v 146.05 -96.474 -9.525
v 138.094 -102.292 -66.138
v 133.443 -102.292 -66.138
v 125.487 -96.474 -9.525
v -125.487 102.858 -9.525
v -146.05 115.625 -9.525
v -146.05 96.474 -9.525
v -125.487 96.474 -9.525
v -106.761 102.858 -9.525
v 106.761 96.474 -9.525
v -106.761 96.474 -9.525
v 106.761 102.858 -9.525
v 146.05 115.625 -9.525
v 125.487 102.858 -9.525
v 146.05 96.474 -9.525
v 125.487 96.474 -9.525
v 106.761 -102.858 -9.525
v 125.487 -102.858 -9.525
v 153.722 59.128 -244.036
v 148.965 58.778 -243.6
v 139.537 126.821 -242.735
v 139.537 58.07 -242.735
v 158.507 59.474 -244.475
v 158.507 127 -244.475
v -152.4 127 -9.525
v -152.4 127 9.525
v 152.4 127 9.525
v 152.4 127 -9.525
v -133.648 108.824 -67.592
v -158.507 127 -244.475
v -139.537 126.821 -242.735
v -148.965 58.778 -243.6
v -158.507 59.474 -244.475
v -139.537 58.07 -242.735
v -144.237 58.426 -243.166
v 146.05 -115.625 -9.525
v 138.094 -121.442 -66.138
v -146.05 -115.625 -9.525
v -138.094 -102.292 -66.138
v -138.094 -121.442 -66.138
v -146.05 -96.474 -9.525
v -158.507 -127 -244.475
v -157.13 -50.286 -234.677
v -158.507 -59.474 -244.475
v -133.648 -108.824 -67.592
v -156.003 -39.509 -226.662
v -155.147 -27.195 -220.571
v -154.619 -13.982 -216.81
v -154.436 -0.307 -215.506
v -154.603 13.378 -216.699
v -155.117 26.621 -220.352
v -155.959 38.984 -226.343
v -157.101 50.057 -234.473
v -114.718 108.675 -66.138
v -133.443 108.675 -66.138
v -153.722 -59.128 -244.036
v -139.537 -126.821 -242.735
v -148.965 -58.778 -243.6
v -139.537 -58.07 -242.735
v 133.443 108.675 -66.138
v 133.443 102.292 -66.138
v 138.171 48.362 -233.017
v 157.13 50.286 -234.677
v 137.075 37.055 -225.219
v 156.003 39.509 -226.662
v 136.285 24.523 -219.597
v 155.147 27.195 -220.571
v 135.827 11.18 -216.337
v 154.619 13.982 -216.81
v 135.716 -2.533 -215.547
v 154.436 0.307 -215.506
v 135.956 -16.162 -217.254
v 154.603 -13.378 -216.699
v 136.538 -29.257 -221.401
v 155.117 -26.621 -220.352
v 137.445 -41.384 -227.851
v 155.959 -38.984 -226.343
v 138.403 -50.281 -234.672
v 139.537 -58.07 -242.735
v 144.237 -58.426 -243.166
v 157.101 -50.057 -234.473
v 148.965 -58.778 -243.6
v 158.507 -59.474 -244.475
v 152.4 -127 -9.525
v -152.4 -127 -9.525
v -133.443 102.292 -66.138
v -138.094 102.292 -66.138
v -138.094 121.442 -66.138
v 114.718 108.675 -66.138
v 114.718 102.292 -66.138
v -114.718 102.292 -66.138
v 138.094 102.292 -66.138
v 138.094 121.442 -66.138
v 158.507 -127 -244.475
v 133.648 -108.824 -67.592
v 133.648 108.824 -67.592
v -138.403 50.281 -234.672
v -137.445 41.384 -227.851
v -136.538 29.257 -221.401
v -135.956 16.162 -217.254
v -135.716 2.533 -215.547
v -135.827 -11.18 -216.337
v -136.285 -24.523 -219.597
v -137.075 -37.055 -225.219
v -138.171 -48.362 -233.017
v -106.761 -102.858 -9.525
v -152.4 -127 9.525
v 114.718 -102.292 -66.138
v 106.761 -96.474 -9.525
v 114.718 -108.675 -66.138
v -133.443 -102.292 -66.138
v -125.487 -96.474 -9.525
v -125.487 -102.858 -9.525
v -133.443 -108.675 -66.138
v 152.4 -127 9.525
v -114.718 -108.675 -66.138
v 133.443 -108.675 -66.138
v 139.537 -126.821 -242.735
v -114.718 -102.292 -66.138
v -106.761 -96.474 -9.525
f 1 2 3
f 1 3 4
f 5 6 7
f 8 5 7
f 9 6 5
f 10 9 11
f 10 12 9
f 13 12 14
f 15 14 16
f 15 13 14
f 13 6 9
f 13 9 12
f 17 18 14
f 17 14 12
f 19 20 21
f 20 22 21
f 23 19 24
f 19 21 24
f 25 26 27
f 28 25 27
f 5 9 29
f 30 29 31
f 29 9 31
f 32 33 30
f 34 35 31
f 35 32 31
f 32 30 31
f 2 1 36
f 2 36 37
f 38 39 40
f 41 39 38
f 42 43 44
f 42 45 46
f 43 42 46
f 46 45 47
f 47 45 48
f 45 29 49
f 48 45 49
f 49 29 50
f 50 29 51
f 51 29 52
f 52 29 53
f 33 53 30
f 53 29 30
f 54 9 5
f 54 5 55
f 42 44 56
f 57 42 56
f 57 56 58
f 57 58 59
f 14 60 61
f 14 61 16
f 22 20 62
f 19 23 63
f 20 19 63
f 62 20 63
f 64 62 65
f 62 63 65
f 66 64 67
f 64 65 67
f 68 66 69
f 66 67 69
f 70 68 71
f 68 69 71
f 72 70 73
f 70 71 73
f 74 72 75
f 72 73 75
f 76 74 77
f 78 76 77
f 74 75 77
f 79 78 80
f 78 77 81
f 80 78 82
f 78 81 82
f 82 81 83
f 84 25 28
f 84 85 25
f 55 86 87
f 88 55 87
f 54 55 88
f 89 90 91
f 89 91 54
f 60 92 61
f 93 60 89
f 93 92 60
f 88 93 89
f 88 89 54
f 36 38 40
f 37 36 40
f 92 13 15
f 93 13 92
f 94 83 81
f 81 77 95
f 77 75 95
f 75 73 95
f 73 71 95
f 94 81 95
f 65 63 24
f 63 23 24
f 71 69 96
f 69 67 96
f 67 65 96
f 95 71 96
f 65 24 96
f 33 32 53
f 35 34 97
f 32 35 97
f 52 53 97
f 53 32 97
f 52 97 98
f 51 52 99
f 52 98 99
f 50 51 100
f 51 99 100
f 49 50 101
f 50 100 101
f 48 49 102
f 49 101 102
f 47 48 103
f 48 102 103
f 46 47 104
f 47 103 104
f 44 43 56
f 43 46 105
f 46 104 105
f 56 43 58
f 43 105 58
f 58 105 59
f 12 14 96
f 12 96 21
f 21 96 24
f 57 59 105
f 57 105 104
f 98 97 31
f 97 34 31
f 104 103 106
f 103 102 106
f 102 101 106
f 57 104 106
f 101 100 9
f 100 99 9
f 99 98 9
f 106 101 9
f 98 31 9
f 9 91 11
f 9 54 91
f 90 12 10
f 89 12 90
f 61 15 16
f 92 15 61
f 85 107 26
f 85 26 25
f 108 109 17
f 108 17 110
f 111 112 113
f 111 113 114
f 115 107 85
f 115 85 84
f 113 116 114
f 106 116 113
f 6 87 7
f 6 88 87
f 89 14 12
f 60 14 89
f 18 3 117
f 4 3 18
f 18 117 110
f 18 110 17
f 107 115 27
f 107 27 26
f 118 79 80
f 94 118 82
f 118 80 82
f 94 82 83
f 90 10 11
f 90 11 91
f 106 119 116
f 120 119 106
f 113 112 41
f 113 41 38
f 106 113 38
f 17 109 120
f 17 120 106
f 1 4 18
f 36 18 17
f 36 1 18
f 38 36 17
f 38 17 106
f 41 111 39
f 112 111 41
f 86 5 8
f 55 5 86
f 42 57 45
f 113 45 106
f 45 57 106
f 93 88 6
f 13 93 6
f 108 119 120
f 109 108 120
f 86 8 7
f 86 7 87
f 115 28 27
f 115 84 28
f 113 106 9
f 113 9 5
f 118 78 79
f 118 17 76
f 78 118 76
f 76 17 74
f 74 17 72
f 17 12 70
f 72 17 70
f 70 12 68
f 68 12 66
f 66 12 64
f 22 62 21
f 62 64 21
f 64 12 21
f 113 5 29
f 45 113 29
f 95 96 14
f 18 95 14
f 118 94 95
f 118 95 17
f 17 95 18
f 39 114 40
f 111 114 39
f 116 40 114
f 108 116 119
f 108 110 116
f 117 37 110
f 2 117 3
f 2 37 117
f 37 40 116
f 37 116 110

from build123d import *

# Parameters (mm, degrees)
F1_DEPTH      = 127
F2_DEPTH      = 127
F2_DEPTH_BACK = 127
F4_DEPTH      = 158.5079027961
F4_DEPTH_BACK = 158.5079027961
F6_DEPTH      = 152.146
F6_DEPTH_BACK = 152.146
F7_DEPTH      = 127.001
F7_DEPTH_BACK = 127.001


with BuildPart() as f1:
    # F0 (on Front) → F1 (new body, symmetric)
    with BuildSketch(Plane.XZ):
        Polygon((146.05, -9.525), (152.4, -9.525), (152.4, 9.525), (-152.4, 9.525), (-152.4, -9.525), (-146.05, -9.525), (-125.4868336827, -9.525), (-106.7610483312, -9.525), (106.7610483312, -9.525), (125.4868336827, -9.525), align=None)
    extrude(amount=F1_DEPTH, both=True)


with BuildPart() as f2:
    # F0 (on Front) → F2 (new body, two sides)
    with BuildSketch(Plane.XZ) as f2_sk:
        Polygon((-139.536550618, -242.7348166075), (-114.9217637123, -67.5915071359), (-133.6475490639, -67.5915071359), (-158.5069027961, -244.475), align=None)
        Polygon((-114.9217637123, -67.5915071359), (-106.7610483312, -9.525), (-125.4868336827, -9.525), (-133.6475490639, -67.5915071359), align=None)
    extrude(amount=-F2_DEPTH)
    extrude(f2_sk.sketch, amount=F2_DEPTH_BACK)


with BuildPart() as f2b:
    # F0 (on Front) → F2, piece 2 (new body, two sides)
    with BuildSketch(Plane.XZ) as f2_2_sk:
        Polygon((133.6475490639, -67.5915071359), (125.4868336827, -9.525), (106.7610483312, -9.525), (114.9217637123, -67.5915071359), align=None)
        Polygon((158.5069027961, -244.475), (133.6475490639, -67.5915071359), (114.9217637123, -67.5915071359), (139.536550618, -242.7348166075), align=None)
    extrude(amount=-F2_DEPTH)
    extrude(f2_2_sk.sketch, amount=F2_DEPTH_BACK)


with BuildPart() as f4_tool:
    # F3 (on Right) → F4 (new body, two sides)
    with BuildSketch(Plane.YZ) as f4_sk:
        Polygon((-126.9999999997, -244.475), (-102.8577622345, -9.525), (-126.9999999998, -9.525), align=None)
        Polygon((127.0000000002, -9.525), (102.8577622345, -9.525), (126.9999999997, -244.475), align=None)
        with BuildLine():
            ThreePointArc((59.4740621746, -244.475), (33.07728348, -223.1326092532), (0, -215.5049696562))
            ThreePointArc((0, -215.5049696562), (-33.07728348, -223.1326092532), (-59.4740621746, -244.475))
            Line((-59.4740621746, -244.475), (59.4740621746, -244.475))
        make_face()
    extrude(amount=F4_DEPTH)
    extrude(f4_sk.sketch, amount=-F4_DEPTH_BACK)


with BuildPart() as f2_1:
    add(f2.part)

    # F4: cut by f4_tool
    add(f4_tool.part, mode=Mode.SUBTRACT)


with BuildPart() as f2b_1:
    add(f2b.part)

    # F4: cut by f4_tool
    add(f4_tool.part, mode=Mode.SUBTRACT)


with BuildPart() as f6:
    # F5 (on Right) → F6 (new body, two sides)
    with BuildSketch(Plane.YZ) as f6_sk:
        Polygon((-108.6750508712, -66.1383089442), (-102.8577622345, -9.525), (-115.6246329554, -9.525), (-121.4419215921, -66.1383089442), align=None)
        Polygon((-96.474326874, -9.525), (-102.8577622345, -9.525), (-108.6750508712, -66.1383089442), (-102.2916155108, -66.1383089442), align=None)
    extrude(amount=F6_DEPTH)
    extrude(f6_sk.sketch, amount=-F6_DEPTH_BACK)


with BuildPart() as f6b:
    # F5 (on Right) → F6, piece 2 (new body, two sides)
    with BuildSketch(Plane.YZ) as f6_2_sk:
        Polygon((102.8577622344, -9.525), (96.474326874, -9.525), (102.2916155108, -66.1383089442), (108.6750508712, -66.1383089442), align=None)
        Polygon((115.6246329554, -9.525), (102.8577622344, -9.525), (108.6750508712, -66.1383089442), (121.4419215921, -66.1383089442), align=None)
    extrude(amount=F6_DEPTH)
    extrude(f6_2_sk.sketch, amount=-F6_DEPTH_BACK)


with BuildPart() as f7_tool:
    # F0 (on Front) → F7 (new body, two sides)
    with BuildSketch(Plane.XZ) as f7_sk:
        Polygon((-146.05, -9.525), (-152.4, -9.525), (-152.4, -67.5915071359), (-137.8892846189, -67.5915071359), align=None)
        Polygon((152.4, -67.5915071359), (152.4, -9.525), (146.05, -9.525), (137.8892846189, -67.5915071359), align=None)
    extrude(amount=-F7_DEPTH)
    extrude(f7_sk.sketch, amount=F7_DEPTH_BACK)


with BuildPart() as f6_1:
    add(f6.part)

    # F7: cut by f7_tool
    add(f7_tool.part, mode=Mode.SUBTRACT)

    # F8: cut F2b
    add(f2b_1.part, mode=Mode.SUBTRACT)

    # F10: cut F2
    add(f2_1.part, mode=Mode.SUBTRACT)


with BuildPart() as f6b_1:
    add(f6b.part)

    # F7: cut by f7_tool
    add(f7_tool.part, mode=Mode.SUBTRACT)

    # F9: cut F2b
    add(f2b_1.part, mode=Mode.SUBTRACT)

    # F11: cut F2
    add(f2_1.part, mode=Mode.SUBTRACT)


solid = Compound([f1.part, f2_1.part, f2b_1.part, f6_1.part, f6b_1.part])
